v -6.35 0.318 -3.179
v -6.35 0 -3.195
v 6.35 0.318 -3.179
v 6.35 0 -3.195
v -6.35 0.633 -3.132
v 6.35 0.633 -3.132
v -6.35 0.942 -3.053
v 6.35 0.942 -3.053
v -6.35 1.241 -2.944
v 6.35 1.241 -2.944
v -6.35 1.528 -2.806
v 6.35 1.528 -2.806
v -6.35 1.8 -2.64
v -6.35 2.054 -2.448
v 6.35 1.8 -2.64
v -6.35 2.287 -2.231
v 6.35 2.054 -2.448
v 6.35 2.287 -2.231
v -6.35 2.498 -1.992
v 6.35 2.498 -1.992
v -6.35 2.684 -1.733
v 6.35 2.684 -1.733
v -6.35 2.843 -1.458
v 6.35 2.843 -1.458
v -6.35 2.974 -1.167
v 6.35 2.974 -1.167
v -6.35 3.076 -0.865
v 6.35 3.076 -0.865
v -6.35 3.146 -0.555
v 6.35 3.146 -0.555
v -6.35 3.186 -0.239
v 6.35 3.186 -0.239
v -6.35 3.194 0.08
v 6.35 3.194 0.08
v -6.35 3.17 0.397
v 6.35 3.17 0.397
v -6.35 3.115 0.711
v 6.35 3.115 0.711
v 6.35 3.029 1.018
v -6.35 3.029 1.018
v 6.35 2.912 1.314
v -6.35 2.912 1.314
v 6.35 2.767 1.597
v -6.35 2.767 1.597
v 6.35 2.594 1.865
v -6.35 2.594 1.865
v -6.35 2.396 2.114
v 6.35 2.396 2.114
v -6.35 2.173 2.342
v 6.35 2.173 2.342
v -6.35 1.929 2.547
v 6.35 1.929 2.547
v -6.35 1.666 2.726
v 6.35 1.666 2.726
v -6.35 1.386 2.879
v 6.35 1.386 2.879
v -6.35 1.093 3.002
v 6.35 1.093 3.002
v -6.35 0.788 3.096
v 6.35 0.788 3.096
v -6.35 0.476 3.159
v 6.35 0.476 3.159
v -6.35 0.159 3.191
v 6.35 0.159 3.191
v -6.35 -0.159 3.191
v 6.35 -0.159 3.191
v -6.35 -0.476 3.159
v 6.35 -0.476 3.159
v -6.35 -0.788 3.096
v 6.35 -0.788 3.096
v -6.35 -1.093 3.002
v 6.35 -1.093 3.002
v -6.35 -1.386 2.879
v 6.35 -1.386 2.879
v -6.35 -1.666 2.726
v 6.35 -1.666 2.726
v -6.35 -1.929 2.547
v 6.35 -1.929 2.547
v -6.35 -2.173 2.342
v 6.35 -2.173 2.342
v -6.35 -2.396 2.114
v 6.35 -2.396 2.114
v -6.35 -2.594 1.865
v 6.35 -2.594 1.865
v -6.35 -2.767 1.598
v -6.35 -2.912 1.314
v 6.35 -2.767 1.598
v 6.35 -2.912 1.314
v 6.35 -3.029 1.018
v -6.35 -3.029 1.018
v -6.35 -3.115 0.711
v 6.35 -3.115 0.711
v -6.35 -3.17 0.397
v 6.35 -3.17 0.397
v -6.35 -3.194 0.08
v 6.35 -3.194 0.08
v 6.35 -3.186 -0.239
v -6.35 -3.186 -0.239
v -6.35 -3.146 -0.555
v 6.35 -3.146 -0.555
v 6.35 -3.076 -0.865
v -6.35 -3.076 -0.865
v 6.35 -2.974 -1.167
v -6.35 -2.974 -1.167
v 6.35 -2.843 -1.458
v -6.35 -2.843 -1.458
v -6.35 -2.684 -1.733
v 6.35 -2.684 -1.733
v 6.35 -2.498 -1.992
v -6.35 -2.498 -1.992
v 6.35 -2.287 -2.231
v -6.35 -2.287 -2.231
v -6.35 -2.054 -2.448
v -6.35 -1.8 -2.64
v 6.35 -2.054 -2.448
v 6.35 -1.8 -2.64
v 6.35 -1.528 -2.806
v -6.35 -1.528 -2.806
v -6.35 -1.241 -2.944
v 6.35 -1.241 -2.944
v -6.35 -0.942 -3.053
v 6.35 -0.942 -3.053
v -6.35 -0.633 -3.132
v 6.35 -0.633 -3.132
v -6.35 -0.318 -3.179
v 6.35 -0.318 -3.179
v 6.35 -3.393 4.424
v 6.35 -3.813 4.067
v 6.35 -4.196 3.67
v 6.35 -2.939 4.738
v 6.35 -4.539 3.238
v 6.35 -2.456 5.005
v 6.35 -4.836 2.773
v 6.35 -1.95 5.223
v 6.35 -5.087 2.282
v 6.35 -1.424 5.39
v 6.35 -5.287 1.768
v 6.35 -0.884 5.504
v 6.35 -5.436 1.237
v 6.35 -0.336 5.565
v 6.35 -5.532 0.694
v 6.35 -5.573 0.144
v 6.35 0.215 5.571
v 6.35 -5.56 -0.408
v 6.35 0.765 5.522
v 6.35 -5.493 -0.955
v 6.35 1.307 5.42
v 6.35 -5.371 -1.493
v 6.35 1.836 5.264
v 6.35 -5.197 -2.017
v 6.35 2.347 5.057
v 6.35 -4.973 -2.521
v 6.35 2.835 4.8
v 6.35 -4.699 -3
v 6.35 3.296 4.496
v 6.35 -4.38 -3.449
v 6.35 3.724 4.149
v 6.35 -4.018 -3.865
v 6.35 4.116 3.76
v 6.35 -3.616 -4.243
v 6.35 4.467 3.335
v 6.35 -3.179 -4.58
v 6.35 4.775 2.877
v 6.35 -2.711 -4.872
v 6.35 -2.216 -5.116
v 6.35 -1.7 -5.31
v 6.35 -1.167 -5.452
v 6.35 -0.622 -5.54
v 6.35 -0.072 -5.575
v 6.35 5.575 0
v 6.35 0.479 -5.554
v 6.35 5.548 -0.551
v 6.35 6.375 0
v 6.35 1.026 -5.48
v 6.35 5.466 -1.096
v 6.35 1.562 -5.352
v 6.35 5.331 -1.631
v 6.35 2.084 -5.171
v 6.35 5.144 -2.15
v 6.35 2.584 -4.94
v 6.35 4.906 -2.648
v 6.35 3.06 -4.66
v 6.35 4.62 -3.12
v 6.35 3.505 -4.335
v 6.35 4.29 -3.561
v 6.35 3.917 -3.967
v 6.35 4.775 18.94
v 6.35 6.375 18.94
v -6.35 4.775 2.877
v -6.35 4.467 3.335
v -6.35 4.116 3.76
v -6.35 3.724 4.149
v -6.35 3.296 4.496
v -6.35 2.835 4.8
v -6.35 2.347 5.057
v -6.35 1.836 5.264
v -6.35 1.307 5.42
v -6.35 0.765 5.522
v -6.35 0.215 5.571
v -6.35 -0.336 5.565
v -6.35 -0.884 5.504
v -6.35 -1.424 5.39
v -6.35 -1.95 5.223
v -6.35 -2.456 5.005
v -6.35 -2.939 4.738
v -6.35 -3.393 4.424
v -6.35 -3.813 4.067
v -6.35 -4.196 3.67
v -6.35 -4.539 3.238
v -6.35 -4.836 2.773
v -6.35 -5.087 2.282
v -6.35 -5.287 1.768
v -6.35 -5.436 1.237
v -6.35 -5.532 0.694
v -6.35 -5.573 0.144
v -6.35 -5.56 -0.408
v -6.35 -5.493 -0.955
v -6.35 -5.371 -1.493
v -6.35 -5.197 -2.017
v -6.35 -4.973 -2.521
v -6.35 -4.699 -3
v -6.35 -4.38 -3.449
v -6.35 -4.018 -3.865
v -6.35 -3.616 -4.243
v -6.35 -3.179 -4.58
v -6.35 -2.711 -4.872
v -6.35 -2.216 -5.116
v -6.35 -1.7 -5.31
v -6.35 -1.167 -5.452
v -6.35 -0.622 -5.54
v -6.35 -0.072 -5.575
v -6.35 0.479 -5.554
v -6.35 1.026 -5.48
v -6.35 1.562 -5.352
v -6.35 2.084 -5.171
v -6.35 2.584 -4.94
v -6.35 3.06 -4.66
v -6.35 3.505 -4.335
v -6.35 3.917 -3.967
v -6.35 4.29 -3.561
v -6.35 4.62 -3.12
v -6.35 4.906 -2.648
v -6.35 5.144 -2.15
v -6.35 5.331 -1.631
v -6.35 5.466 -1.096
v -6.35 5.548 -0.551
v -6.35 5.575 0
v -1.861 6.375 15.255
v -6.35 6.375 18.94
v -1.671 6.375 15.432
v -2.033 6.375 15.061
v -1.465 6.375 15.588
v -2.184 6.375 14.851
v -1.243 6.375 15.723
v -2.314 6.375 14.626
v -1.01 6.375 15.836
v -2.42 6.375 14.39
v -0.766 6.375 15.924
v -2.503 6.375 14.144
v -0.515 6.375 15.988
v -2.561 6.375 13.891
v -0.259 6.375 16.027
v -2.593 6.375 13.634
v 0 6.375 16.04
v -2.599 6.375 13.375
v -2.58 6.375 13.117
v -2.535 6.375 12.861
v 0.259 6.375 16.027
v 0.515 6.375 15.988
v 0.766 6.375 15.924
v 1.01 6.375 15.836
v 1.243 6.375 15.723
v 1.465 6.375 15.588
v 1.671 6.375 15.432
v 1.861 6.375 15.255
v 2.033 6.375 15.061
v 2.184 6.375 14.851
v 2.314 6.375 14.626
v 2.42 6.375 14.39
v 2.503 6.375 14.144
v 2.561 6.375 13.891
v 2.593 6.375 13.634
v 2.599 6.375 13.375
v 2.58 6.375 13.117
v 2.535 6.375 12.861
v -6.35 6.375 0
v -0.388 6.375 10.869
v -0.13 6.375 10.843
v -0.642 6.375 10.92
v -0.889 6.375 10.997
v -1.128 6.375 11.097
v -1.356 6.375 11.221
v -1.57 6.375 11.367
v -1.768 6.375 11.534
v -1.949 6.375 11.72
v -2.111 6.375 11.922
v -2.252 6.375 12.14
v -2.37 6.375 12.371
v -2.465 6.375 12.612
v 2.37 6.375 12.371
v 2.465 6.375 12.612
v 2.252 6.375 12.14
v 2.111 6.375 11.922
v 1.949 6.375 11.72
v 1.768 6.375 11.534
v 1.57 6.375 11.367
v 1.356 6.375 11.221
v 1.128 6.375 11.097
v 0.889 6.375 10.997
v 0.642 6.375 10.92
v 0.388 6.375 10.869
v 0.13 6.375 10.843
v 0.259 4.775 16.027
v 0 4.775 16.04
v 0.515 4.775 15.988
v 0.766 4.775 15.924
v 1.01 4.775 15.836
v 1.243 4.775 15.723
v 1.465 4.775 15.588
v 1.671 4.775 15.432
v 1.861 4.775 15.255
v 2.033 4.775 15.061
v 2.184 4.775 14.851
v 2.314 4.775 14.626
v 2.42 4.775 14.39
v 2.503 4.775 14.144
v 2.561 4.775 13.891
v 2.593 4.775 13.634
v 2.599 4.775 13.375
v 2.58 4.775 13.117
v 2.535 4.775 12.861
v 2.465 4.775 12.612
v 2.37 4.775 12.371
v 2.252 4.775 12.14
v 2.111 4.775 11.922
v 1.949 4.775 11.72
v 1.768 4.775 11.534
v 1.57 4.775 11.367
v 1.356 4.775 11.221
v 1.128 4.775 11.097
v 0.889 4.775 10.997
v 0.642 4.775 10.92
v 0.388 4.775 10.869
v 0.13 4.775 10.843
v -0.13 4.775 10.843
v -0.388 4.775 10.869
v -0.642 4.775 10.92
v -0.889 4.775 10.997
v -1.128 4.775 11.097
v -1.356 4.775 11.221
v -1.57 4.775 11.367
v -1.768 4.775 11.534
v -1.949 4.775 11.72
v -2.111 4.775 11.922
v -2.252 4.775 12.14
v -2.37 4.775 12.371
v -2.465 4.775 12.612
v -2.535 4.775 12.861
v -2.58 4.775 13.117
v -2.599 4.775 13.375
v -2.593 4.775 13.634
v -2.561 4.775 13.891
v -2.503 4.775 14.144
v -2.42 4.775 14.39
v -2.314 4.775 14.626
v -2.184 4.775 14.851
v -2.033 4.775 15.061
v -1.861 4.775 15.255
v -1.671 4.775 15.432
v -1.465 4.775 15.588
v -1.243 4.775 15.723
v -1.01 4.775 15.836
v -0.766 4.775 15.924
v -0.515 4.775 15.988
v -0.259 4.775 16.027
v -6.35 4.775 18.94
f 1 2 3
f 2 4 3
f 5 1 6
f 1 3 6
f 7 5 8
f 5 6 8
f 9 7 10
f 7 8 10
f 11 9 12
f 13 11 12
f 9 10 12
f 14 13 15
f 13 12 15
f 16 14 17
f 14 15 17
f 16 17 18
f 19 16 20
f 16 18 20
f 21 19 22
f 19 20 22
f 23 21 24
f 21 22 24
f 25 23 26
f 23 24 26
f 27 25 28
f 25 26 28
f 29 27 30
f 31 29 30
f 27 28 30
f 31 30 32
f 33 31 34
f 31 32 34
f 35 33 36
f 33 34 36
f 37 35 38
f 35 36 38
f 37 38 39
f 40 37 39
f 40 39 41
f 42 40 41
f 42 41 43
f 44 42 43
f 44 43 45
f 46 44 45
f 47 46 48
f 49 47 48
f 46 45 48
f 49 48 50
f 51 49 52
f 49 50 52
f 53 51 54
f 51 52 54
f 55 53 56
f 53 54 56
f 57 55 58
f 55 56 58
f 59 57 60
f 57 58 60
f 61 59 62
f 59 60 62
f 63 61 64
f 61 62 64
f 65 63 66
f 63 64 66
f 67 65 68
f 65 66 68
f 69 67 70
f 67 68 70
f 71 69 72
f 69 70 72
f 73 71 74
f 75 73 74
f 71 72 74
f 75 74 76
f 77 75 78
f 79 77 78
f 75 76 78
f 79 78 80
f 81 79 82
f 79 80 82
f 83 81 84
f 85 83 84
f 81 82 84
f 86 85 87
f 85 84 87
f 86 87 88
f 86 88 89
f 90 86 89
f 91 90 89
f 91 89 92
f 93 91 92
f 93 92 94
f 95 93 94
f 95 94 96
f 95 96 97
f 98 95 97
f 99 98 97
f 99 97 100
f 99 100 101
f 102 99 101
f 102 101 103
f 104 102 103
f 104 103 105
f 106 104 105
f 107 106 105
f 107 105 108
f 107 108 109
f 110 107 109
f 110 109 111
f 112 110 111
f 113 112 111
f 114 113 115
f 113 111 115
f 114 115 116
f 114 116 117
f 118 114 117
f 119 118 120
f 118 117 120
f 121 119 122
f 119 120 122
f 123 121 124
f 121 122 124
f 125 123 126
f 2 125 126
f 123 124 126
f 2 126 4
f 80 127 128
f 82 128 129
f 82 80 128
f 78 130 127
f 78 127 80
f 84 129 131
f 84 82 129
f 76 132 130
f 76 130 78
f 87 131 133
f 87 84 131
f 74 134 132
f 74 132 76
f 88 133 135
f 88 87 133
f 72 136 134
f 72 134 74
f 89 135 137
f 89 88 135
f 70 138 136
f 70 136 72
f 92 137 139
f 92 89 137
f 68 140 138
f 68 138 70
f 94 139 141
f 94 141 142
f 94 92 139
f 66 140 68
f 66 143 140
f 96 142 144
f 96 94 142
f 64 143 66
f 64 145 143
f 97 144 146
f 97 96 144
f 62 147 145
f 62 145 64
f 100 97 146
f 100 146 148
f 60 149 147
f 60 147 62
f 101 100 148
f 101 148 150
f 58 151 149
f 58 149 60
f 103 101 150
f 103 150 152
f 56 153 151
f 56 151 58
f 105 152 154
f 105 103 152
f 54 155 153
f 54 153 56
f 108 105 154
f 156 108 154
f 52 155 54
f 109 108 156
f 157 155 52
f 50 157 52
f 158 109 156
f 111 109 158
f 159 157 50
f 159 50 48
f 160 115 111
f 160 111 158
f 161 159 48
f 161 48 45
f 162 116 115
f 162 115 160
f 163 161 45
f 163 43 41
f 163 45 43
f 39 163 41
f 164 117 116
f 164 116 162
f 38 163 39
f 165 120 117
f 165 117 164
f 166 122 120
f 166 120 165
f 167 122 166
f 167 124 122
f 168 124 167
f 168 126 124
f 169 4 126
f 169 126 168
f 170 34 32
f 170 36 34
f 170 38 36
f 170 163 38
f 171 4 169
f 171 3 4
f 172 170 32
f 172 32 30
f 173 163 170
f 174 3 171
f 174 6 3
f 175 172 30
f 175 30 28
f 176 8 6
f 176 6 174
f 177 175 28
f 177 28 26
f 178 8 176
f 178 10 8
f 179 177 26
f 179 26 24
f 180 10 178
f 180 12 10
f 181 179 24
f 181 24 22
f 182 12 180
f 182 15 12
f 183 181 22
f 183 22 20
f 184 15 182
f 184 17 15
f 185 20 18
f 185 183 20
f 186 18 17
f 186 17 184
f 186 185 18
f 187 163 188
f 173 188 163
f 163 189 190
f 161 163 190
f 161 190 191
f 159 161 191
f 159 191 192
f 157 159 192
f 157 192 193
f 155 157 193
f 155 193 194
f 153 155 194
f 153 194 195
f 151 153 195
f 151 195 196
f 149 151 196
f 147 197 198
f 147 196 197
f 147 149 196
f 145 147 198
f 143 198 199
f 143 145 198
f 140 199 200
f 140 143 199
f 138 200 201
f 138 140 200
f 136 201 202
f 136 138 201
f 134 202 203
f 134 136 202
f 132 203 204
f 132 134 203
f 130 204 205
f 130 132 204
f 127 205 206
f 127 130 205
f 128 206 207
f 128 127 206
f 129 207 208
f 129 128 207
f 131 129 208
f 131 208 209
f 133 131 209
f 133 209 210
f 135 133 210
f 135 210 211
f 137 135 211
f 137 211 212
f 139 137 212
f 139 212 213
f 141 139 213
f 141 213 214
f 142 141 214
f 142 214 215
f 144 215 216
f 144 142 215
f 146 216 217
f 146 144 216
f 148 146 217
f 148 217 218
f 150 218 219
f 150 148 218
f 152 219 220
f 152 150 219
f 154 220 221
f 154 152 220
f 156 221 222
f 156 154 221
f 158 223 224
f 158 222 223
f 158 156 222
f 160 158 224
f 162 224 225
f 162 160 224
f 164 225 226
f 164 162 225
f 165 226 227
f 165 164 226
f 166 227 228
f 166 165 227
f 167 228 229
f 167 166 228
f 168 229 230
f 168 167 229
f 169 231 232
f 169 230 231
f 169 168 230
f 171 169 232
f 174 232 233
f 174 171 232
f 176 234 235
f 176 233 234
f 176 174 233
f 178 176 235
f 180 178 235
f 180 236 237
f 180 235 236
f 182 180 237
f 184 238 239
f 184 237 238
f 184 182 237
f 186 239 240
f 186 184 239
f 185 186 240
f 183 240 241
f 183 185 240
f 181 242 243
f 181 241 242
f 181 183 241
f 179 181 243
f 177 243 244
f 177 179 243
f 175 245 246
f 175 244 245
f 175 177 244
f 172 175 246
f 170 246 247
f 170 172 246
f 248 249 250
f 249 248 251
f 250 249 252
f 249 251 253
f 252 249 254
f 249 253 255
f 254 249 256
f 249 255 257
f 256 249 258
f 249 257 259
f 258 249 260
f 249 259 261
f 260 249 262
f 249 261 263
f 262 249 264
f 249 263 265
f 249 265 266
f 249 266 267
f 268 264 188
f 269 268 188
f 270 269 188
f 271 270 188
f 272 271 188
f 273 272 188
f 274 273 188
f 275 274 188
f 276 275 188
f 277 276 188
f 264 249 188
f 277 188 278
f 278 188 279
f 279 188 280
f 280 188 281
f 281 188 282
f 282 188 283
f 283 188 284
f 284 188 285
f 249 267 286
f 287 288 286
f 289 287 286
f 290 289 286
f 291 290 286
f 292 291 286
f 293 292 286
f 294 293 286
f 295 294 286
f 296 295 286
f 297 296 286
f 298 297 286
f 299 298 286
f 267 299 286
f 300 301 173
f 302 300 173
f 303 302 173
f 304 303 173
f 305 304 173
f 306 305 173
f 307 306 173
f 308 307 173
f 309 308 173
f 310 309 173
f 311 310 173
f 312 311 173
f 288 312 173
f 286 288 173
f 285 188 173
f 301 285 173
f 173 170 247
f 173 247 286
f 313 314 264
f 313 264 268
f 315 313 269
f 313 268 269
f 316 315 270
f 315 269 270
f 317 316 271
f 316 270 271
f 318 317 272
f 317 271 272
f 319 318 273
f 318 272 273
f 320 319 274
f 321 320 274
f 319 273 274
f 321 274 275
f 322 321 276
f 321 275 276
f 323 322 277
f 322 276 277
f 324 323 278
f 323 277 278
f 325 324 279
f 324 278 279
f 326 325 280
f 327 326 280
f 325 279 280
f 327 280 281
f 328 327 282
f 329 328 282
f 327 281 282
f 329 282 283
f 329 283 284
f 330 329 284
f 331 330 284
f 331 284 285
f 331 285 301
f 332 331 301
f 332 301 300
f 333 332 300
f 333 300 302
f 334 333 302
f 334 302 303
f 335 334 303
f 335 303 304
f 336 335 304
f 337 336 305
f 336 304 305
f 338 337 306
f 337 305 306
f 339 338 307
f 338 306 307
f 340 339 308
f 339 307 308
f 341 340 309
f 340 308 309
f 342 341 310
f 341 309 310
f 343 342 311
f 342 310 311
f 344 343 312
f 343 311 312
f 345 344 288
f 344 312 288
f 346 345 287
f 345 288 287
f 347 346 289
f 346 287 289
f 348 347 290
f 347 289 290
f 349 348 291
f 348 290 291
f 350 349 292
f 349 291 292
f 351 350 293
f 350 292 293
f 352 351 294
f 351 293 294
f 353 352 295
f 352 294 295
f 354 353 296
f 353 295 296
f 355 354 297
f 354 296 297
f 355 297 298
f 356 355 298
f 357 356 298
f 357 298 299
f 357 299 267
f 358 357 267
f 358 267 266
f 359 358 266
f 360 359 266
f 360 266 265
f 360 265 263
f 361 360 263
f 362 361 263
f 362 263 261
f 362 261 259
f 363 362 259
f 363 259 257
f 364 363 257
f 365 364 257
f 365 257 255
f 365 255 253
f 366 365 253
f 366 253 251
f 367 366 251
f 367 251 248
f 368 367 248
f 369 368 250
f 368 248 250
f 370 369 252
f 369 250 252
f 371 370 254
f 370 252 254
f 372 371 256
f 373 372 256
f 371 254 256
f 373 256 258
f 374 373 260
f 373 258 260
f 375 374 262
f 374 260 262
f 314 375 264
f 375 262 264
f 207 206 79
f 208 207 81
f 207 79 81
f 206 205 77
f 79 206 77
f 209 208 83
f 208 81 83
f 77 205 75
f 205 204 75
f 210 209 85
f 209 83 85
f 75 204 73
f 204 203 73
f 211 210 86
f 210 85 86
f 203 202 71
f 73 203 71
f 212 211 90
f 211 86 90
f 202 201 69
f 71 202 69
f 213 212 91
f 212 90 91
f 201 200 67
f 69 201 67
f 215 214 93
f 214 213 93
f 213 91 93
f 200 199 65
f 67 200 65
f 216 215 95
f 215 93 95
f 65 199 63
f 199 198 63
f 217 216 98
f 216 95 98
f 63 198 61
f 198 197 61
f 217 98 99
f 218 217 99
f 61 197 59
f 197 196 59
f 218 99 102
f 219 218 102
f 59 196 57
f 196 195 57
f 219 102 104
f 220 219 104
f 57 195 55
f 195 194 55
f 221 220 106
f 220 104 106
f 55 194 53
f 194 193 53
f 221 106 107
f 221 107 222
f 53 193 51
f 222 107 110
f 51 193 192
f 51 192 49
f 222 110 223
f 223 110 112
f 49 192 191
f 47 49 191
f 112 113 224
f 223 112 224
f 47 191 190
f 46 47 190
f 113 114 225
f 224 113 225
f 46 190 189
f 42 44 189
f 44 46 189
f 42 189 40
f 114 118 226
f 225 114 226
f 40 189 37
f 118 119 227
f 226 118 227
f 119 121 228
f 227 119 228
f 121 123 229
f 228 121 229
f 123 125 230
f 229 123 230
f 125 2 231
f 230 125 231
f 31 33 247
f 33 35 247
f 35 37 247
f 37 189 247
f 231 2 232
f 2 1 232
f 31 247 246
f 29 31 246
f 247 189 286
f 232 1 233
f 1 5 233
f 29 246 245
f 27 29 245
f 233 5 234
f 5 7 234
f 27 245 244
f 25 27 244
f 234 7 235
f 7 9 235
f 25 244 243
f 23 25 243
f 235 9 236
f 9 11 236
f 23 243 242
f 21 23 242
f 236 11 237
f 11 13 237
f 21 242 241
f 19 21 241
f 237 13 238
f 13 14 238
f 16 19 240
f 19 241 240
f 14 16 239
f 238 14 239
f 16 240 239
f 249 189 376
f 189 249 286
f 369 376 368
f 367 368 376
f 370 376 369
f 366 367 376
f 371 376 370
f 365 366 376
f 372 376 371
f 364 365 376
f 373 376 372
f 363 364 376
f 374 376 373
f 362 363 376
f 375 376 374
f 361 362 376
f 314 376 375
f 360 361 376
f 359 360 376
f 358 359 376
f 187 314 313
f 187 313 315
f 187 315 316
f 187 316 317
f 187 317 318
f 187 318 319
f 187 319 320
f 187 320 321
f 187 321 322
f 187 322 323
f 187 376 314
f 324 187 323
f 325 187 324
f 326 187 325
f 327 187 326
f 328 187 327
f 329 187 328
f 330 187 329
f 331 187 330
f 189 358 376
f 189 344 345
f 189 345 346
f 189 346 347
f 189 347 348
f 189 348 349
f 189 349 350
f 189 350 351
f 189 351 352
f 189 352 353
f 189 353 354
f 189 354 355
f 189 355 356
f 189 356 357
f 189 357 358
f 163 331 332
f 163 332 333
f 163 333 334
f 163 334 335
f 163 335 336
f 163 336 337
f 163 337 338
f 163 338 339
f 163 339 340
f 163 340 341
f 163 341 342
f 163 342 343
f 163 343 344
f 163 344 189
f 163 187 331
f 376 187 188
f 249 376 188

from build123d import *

# Parameters (mm, degrees)
LOOP_SKETCH_R       = 5.575
LOOP_DEPTH          = 6.35
TAB_SKETCH_W        = 18.94
TAB_SKETCH_H        = 1.6
TAB_DEPTH           = 6.35
TUBE_HOLE_SKETCH_R  = 3.195
TUBE_HOLE_DEPTH     = 7.35
MOUNT_HOLE_SKETCH_R = 2.6
MOUNT_HOLE_DEPTH    = 20


with BuildPart() as part:
    # Loop Sketch → Loop (new, symmetric)
    with BuildSketch(Plane(origin=(0, 0, 0), x_dir=(0, 0, -1), z_dir=(1, 0, 0))):
        Circle(LOOP_SKETCH_R)
    extrude(amount=LOOP_DEPTH, both=True)

    # Tab Sketch → Tab (add, symmetric)
    with BuildSketch(Plane(origin=(0, 0, 0), x_dir=(0, 0, -1), z_dir=(1, 0, 0))):
        with Locations((-9.47, 5.575)):
            Rectangle(TAB_SKETCH_W, TAB_SKETCH_H)
    extrude(amount=TAB_DEPTH, both=True)

    # Tube Hole Sketch → Tube Hole (cut, symmetric)
    with BuildSketch(Plane(origin=(0, 0, 0), x_dir=(0, 0, -1), z_dir=(1, 0, 0))):
        Circle(TUBE_HOLE_SKETCH_R)
    extrude(amount=TUBE_HOLE_DEPTH, both=True, mode=Mode.SUBTRACT)

    # Mount Hole Sketch → Mount Hole (cut, symmetric)
    with BuildSketch(Plane(origin=(0, 0, 0), x_dir=(1, 0, 0), z_dir=(0, 1, 0))):
        with Locations((0, -13.44)):
            Circle(MOUNT_HOLE_SKETCH_R)
    extrude(amount=MOUNT_HOLE_DEPTH, both=True, mode=Mode.SUBTRACT)


solid = part.part
